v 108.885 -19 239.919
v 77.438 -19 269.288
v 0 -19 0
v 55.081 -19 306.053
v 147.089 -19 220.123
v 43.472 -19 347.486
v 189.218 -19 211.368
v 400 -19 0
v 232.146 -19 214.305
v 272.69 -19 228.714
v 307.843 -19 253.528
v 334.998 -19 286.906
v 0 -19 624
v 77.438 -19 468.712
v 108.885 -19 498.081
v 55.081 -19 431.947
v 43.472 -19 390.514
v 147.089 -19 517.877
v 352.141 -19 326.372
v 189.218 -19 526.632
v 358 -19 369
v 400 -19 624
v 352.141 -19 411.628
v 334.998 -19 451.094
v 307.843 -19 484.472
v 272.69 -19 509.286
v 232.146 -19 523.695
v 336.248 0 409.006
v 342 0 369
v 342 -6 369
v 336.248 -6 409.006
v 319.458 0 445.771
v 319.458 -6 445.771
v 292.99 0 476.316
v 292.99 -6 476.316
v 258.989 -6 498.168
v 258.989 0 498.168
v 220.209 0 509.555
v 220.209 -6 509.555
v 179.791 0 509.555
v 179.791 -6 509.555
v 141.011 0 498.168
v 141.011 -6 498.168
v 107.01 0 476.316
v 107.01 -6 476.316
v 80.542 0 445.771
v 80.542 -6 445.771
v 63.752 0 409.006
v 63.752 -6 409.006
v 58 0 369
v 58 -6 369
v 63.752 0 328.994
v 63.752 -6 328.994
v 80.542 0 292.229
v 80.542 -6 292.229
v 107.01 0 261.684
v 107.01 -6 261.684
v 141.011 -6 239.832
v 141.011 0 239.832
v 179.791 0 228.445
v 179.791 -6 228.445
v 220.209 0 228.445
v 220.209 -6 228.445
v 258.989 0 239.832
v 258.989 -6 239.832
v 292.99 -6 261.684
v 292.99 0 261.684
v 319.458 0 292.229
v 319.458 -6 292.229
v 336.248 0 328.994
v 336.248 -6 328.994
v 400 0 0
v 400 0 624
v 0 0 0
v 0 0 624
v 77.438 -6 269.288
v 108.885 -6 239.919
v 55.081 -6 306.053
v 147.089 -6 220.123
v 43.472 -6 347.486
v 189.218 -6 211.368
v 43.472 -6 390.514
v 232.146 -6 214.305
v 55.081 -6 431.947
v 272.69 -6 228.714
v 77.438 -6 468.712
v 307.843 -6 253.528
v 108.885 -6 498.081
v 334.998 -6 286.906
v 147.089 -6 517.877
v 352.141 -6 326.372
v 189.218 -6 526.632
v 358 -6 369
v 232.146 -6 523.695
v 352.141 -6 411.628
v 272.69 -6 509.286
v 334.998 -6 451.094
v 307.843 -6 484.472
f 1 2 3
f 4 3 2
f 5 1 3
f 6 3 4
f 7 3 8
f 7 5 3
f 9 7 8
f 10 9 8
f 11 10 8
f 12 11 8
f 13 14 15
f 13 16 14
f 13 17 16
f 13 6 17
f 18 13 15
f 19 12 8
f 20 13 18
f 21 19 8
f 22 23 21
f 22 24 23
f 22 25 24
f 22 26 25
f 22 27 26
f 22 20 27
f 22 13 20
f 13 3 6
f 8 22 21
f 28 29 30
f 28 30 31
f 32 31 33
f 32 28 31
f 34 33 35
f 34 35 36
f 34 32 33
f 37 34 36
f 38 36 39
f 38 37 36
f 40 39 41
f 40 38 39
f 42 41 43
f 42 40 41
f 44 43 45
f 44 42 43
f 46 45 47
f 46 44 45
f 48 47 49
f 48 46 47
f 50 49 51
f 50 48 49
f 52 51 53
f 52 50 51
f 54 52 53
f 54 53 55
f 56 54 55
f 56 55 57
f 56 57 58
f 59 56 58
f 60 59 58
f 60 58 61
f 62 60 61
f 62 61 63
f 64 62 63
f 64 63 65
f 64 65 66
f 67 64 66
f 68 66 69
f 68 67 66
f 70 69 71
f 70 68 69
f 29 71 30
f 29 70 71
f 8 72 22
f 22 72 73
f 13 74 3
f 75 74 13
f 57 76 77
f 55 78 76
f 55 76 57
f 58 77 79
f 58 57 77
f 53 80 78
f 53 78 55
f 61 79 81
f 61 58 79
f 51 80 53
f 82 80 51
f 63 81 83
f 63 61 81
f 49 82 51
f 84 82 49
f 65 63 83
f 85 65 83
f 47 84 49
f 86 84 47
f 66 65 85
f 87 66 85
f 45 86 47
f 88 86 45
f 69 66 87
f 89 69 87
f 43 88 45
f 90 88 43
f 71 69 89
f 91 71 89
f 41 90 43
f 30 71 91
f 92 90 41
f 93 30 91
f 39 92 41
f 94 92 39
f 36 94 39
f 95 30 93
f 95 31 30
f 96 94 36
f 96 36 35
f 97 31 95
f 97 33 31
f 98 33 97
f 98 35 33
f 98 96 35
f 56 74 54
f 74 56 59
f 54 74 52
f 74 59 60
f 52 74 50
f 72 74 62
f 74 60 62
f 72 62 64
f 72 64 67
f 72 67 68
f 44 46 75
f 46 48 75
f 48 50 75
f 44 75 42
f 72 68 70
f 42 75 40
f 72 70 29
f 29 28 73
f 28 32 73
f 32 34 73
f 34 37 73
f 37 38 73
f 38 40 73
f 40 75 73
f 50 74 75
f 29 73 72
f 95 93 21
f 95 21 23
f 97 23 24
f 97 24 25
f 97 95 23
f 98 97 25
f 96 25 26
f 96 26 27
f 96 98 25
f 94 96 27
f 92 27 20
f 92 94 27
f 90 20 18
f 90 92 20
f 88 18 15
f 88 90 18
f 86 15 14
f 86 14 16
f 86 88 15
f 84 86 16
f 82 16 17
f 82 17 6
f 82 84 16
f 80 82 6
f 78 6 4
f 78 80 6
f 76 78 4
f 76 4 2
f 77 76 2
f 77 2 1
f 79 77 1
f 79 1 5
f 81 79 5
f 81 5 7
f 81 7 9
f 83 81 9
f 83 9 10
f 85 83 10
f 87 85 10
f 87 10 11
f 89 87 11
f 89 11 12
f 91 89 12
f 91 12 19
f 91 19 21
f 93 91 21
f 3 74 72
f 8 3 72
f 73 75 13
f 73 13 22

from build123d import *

# Parameters (mm, degrees)
F0_W     = 400
F0_H     = 624
F0_R     = 158
F1_DEPTH = 19
F0_R_2   = 142
F2_DEPTH = 6


with BuildPart() as f1:
    # F0 (on Front) → F1 (new body)
    with BuildSketch(Plane.XZ):
        with Locations((200, 312)):
            Rectangle(F0_W, F0_H)
        with Locations((200, 369)):
            Circle(F0_R, mode=Mode.SUBTRACT)
    extrude(amount=F1_DEPTH)

    # F0 (on Front) → F2 (join)
    with BuildSketch(Plane.XZ):
        with Locations((200, 369)):
            Circle(F0_R)
        with Locations((200, 369)):
            Circle(F0_R_2, mode=Mode.SUBTRACT)
    extrude(amount=F2_DEPTH)


solid = f1.part
